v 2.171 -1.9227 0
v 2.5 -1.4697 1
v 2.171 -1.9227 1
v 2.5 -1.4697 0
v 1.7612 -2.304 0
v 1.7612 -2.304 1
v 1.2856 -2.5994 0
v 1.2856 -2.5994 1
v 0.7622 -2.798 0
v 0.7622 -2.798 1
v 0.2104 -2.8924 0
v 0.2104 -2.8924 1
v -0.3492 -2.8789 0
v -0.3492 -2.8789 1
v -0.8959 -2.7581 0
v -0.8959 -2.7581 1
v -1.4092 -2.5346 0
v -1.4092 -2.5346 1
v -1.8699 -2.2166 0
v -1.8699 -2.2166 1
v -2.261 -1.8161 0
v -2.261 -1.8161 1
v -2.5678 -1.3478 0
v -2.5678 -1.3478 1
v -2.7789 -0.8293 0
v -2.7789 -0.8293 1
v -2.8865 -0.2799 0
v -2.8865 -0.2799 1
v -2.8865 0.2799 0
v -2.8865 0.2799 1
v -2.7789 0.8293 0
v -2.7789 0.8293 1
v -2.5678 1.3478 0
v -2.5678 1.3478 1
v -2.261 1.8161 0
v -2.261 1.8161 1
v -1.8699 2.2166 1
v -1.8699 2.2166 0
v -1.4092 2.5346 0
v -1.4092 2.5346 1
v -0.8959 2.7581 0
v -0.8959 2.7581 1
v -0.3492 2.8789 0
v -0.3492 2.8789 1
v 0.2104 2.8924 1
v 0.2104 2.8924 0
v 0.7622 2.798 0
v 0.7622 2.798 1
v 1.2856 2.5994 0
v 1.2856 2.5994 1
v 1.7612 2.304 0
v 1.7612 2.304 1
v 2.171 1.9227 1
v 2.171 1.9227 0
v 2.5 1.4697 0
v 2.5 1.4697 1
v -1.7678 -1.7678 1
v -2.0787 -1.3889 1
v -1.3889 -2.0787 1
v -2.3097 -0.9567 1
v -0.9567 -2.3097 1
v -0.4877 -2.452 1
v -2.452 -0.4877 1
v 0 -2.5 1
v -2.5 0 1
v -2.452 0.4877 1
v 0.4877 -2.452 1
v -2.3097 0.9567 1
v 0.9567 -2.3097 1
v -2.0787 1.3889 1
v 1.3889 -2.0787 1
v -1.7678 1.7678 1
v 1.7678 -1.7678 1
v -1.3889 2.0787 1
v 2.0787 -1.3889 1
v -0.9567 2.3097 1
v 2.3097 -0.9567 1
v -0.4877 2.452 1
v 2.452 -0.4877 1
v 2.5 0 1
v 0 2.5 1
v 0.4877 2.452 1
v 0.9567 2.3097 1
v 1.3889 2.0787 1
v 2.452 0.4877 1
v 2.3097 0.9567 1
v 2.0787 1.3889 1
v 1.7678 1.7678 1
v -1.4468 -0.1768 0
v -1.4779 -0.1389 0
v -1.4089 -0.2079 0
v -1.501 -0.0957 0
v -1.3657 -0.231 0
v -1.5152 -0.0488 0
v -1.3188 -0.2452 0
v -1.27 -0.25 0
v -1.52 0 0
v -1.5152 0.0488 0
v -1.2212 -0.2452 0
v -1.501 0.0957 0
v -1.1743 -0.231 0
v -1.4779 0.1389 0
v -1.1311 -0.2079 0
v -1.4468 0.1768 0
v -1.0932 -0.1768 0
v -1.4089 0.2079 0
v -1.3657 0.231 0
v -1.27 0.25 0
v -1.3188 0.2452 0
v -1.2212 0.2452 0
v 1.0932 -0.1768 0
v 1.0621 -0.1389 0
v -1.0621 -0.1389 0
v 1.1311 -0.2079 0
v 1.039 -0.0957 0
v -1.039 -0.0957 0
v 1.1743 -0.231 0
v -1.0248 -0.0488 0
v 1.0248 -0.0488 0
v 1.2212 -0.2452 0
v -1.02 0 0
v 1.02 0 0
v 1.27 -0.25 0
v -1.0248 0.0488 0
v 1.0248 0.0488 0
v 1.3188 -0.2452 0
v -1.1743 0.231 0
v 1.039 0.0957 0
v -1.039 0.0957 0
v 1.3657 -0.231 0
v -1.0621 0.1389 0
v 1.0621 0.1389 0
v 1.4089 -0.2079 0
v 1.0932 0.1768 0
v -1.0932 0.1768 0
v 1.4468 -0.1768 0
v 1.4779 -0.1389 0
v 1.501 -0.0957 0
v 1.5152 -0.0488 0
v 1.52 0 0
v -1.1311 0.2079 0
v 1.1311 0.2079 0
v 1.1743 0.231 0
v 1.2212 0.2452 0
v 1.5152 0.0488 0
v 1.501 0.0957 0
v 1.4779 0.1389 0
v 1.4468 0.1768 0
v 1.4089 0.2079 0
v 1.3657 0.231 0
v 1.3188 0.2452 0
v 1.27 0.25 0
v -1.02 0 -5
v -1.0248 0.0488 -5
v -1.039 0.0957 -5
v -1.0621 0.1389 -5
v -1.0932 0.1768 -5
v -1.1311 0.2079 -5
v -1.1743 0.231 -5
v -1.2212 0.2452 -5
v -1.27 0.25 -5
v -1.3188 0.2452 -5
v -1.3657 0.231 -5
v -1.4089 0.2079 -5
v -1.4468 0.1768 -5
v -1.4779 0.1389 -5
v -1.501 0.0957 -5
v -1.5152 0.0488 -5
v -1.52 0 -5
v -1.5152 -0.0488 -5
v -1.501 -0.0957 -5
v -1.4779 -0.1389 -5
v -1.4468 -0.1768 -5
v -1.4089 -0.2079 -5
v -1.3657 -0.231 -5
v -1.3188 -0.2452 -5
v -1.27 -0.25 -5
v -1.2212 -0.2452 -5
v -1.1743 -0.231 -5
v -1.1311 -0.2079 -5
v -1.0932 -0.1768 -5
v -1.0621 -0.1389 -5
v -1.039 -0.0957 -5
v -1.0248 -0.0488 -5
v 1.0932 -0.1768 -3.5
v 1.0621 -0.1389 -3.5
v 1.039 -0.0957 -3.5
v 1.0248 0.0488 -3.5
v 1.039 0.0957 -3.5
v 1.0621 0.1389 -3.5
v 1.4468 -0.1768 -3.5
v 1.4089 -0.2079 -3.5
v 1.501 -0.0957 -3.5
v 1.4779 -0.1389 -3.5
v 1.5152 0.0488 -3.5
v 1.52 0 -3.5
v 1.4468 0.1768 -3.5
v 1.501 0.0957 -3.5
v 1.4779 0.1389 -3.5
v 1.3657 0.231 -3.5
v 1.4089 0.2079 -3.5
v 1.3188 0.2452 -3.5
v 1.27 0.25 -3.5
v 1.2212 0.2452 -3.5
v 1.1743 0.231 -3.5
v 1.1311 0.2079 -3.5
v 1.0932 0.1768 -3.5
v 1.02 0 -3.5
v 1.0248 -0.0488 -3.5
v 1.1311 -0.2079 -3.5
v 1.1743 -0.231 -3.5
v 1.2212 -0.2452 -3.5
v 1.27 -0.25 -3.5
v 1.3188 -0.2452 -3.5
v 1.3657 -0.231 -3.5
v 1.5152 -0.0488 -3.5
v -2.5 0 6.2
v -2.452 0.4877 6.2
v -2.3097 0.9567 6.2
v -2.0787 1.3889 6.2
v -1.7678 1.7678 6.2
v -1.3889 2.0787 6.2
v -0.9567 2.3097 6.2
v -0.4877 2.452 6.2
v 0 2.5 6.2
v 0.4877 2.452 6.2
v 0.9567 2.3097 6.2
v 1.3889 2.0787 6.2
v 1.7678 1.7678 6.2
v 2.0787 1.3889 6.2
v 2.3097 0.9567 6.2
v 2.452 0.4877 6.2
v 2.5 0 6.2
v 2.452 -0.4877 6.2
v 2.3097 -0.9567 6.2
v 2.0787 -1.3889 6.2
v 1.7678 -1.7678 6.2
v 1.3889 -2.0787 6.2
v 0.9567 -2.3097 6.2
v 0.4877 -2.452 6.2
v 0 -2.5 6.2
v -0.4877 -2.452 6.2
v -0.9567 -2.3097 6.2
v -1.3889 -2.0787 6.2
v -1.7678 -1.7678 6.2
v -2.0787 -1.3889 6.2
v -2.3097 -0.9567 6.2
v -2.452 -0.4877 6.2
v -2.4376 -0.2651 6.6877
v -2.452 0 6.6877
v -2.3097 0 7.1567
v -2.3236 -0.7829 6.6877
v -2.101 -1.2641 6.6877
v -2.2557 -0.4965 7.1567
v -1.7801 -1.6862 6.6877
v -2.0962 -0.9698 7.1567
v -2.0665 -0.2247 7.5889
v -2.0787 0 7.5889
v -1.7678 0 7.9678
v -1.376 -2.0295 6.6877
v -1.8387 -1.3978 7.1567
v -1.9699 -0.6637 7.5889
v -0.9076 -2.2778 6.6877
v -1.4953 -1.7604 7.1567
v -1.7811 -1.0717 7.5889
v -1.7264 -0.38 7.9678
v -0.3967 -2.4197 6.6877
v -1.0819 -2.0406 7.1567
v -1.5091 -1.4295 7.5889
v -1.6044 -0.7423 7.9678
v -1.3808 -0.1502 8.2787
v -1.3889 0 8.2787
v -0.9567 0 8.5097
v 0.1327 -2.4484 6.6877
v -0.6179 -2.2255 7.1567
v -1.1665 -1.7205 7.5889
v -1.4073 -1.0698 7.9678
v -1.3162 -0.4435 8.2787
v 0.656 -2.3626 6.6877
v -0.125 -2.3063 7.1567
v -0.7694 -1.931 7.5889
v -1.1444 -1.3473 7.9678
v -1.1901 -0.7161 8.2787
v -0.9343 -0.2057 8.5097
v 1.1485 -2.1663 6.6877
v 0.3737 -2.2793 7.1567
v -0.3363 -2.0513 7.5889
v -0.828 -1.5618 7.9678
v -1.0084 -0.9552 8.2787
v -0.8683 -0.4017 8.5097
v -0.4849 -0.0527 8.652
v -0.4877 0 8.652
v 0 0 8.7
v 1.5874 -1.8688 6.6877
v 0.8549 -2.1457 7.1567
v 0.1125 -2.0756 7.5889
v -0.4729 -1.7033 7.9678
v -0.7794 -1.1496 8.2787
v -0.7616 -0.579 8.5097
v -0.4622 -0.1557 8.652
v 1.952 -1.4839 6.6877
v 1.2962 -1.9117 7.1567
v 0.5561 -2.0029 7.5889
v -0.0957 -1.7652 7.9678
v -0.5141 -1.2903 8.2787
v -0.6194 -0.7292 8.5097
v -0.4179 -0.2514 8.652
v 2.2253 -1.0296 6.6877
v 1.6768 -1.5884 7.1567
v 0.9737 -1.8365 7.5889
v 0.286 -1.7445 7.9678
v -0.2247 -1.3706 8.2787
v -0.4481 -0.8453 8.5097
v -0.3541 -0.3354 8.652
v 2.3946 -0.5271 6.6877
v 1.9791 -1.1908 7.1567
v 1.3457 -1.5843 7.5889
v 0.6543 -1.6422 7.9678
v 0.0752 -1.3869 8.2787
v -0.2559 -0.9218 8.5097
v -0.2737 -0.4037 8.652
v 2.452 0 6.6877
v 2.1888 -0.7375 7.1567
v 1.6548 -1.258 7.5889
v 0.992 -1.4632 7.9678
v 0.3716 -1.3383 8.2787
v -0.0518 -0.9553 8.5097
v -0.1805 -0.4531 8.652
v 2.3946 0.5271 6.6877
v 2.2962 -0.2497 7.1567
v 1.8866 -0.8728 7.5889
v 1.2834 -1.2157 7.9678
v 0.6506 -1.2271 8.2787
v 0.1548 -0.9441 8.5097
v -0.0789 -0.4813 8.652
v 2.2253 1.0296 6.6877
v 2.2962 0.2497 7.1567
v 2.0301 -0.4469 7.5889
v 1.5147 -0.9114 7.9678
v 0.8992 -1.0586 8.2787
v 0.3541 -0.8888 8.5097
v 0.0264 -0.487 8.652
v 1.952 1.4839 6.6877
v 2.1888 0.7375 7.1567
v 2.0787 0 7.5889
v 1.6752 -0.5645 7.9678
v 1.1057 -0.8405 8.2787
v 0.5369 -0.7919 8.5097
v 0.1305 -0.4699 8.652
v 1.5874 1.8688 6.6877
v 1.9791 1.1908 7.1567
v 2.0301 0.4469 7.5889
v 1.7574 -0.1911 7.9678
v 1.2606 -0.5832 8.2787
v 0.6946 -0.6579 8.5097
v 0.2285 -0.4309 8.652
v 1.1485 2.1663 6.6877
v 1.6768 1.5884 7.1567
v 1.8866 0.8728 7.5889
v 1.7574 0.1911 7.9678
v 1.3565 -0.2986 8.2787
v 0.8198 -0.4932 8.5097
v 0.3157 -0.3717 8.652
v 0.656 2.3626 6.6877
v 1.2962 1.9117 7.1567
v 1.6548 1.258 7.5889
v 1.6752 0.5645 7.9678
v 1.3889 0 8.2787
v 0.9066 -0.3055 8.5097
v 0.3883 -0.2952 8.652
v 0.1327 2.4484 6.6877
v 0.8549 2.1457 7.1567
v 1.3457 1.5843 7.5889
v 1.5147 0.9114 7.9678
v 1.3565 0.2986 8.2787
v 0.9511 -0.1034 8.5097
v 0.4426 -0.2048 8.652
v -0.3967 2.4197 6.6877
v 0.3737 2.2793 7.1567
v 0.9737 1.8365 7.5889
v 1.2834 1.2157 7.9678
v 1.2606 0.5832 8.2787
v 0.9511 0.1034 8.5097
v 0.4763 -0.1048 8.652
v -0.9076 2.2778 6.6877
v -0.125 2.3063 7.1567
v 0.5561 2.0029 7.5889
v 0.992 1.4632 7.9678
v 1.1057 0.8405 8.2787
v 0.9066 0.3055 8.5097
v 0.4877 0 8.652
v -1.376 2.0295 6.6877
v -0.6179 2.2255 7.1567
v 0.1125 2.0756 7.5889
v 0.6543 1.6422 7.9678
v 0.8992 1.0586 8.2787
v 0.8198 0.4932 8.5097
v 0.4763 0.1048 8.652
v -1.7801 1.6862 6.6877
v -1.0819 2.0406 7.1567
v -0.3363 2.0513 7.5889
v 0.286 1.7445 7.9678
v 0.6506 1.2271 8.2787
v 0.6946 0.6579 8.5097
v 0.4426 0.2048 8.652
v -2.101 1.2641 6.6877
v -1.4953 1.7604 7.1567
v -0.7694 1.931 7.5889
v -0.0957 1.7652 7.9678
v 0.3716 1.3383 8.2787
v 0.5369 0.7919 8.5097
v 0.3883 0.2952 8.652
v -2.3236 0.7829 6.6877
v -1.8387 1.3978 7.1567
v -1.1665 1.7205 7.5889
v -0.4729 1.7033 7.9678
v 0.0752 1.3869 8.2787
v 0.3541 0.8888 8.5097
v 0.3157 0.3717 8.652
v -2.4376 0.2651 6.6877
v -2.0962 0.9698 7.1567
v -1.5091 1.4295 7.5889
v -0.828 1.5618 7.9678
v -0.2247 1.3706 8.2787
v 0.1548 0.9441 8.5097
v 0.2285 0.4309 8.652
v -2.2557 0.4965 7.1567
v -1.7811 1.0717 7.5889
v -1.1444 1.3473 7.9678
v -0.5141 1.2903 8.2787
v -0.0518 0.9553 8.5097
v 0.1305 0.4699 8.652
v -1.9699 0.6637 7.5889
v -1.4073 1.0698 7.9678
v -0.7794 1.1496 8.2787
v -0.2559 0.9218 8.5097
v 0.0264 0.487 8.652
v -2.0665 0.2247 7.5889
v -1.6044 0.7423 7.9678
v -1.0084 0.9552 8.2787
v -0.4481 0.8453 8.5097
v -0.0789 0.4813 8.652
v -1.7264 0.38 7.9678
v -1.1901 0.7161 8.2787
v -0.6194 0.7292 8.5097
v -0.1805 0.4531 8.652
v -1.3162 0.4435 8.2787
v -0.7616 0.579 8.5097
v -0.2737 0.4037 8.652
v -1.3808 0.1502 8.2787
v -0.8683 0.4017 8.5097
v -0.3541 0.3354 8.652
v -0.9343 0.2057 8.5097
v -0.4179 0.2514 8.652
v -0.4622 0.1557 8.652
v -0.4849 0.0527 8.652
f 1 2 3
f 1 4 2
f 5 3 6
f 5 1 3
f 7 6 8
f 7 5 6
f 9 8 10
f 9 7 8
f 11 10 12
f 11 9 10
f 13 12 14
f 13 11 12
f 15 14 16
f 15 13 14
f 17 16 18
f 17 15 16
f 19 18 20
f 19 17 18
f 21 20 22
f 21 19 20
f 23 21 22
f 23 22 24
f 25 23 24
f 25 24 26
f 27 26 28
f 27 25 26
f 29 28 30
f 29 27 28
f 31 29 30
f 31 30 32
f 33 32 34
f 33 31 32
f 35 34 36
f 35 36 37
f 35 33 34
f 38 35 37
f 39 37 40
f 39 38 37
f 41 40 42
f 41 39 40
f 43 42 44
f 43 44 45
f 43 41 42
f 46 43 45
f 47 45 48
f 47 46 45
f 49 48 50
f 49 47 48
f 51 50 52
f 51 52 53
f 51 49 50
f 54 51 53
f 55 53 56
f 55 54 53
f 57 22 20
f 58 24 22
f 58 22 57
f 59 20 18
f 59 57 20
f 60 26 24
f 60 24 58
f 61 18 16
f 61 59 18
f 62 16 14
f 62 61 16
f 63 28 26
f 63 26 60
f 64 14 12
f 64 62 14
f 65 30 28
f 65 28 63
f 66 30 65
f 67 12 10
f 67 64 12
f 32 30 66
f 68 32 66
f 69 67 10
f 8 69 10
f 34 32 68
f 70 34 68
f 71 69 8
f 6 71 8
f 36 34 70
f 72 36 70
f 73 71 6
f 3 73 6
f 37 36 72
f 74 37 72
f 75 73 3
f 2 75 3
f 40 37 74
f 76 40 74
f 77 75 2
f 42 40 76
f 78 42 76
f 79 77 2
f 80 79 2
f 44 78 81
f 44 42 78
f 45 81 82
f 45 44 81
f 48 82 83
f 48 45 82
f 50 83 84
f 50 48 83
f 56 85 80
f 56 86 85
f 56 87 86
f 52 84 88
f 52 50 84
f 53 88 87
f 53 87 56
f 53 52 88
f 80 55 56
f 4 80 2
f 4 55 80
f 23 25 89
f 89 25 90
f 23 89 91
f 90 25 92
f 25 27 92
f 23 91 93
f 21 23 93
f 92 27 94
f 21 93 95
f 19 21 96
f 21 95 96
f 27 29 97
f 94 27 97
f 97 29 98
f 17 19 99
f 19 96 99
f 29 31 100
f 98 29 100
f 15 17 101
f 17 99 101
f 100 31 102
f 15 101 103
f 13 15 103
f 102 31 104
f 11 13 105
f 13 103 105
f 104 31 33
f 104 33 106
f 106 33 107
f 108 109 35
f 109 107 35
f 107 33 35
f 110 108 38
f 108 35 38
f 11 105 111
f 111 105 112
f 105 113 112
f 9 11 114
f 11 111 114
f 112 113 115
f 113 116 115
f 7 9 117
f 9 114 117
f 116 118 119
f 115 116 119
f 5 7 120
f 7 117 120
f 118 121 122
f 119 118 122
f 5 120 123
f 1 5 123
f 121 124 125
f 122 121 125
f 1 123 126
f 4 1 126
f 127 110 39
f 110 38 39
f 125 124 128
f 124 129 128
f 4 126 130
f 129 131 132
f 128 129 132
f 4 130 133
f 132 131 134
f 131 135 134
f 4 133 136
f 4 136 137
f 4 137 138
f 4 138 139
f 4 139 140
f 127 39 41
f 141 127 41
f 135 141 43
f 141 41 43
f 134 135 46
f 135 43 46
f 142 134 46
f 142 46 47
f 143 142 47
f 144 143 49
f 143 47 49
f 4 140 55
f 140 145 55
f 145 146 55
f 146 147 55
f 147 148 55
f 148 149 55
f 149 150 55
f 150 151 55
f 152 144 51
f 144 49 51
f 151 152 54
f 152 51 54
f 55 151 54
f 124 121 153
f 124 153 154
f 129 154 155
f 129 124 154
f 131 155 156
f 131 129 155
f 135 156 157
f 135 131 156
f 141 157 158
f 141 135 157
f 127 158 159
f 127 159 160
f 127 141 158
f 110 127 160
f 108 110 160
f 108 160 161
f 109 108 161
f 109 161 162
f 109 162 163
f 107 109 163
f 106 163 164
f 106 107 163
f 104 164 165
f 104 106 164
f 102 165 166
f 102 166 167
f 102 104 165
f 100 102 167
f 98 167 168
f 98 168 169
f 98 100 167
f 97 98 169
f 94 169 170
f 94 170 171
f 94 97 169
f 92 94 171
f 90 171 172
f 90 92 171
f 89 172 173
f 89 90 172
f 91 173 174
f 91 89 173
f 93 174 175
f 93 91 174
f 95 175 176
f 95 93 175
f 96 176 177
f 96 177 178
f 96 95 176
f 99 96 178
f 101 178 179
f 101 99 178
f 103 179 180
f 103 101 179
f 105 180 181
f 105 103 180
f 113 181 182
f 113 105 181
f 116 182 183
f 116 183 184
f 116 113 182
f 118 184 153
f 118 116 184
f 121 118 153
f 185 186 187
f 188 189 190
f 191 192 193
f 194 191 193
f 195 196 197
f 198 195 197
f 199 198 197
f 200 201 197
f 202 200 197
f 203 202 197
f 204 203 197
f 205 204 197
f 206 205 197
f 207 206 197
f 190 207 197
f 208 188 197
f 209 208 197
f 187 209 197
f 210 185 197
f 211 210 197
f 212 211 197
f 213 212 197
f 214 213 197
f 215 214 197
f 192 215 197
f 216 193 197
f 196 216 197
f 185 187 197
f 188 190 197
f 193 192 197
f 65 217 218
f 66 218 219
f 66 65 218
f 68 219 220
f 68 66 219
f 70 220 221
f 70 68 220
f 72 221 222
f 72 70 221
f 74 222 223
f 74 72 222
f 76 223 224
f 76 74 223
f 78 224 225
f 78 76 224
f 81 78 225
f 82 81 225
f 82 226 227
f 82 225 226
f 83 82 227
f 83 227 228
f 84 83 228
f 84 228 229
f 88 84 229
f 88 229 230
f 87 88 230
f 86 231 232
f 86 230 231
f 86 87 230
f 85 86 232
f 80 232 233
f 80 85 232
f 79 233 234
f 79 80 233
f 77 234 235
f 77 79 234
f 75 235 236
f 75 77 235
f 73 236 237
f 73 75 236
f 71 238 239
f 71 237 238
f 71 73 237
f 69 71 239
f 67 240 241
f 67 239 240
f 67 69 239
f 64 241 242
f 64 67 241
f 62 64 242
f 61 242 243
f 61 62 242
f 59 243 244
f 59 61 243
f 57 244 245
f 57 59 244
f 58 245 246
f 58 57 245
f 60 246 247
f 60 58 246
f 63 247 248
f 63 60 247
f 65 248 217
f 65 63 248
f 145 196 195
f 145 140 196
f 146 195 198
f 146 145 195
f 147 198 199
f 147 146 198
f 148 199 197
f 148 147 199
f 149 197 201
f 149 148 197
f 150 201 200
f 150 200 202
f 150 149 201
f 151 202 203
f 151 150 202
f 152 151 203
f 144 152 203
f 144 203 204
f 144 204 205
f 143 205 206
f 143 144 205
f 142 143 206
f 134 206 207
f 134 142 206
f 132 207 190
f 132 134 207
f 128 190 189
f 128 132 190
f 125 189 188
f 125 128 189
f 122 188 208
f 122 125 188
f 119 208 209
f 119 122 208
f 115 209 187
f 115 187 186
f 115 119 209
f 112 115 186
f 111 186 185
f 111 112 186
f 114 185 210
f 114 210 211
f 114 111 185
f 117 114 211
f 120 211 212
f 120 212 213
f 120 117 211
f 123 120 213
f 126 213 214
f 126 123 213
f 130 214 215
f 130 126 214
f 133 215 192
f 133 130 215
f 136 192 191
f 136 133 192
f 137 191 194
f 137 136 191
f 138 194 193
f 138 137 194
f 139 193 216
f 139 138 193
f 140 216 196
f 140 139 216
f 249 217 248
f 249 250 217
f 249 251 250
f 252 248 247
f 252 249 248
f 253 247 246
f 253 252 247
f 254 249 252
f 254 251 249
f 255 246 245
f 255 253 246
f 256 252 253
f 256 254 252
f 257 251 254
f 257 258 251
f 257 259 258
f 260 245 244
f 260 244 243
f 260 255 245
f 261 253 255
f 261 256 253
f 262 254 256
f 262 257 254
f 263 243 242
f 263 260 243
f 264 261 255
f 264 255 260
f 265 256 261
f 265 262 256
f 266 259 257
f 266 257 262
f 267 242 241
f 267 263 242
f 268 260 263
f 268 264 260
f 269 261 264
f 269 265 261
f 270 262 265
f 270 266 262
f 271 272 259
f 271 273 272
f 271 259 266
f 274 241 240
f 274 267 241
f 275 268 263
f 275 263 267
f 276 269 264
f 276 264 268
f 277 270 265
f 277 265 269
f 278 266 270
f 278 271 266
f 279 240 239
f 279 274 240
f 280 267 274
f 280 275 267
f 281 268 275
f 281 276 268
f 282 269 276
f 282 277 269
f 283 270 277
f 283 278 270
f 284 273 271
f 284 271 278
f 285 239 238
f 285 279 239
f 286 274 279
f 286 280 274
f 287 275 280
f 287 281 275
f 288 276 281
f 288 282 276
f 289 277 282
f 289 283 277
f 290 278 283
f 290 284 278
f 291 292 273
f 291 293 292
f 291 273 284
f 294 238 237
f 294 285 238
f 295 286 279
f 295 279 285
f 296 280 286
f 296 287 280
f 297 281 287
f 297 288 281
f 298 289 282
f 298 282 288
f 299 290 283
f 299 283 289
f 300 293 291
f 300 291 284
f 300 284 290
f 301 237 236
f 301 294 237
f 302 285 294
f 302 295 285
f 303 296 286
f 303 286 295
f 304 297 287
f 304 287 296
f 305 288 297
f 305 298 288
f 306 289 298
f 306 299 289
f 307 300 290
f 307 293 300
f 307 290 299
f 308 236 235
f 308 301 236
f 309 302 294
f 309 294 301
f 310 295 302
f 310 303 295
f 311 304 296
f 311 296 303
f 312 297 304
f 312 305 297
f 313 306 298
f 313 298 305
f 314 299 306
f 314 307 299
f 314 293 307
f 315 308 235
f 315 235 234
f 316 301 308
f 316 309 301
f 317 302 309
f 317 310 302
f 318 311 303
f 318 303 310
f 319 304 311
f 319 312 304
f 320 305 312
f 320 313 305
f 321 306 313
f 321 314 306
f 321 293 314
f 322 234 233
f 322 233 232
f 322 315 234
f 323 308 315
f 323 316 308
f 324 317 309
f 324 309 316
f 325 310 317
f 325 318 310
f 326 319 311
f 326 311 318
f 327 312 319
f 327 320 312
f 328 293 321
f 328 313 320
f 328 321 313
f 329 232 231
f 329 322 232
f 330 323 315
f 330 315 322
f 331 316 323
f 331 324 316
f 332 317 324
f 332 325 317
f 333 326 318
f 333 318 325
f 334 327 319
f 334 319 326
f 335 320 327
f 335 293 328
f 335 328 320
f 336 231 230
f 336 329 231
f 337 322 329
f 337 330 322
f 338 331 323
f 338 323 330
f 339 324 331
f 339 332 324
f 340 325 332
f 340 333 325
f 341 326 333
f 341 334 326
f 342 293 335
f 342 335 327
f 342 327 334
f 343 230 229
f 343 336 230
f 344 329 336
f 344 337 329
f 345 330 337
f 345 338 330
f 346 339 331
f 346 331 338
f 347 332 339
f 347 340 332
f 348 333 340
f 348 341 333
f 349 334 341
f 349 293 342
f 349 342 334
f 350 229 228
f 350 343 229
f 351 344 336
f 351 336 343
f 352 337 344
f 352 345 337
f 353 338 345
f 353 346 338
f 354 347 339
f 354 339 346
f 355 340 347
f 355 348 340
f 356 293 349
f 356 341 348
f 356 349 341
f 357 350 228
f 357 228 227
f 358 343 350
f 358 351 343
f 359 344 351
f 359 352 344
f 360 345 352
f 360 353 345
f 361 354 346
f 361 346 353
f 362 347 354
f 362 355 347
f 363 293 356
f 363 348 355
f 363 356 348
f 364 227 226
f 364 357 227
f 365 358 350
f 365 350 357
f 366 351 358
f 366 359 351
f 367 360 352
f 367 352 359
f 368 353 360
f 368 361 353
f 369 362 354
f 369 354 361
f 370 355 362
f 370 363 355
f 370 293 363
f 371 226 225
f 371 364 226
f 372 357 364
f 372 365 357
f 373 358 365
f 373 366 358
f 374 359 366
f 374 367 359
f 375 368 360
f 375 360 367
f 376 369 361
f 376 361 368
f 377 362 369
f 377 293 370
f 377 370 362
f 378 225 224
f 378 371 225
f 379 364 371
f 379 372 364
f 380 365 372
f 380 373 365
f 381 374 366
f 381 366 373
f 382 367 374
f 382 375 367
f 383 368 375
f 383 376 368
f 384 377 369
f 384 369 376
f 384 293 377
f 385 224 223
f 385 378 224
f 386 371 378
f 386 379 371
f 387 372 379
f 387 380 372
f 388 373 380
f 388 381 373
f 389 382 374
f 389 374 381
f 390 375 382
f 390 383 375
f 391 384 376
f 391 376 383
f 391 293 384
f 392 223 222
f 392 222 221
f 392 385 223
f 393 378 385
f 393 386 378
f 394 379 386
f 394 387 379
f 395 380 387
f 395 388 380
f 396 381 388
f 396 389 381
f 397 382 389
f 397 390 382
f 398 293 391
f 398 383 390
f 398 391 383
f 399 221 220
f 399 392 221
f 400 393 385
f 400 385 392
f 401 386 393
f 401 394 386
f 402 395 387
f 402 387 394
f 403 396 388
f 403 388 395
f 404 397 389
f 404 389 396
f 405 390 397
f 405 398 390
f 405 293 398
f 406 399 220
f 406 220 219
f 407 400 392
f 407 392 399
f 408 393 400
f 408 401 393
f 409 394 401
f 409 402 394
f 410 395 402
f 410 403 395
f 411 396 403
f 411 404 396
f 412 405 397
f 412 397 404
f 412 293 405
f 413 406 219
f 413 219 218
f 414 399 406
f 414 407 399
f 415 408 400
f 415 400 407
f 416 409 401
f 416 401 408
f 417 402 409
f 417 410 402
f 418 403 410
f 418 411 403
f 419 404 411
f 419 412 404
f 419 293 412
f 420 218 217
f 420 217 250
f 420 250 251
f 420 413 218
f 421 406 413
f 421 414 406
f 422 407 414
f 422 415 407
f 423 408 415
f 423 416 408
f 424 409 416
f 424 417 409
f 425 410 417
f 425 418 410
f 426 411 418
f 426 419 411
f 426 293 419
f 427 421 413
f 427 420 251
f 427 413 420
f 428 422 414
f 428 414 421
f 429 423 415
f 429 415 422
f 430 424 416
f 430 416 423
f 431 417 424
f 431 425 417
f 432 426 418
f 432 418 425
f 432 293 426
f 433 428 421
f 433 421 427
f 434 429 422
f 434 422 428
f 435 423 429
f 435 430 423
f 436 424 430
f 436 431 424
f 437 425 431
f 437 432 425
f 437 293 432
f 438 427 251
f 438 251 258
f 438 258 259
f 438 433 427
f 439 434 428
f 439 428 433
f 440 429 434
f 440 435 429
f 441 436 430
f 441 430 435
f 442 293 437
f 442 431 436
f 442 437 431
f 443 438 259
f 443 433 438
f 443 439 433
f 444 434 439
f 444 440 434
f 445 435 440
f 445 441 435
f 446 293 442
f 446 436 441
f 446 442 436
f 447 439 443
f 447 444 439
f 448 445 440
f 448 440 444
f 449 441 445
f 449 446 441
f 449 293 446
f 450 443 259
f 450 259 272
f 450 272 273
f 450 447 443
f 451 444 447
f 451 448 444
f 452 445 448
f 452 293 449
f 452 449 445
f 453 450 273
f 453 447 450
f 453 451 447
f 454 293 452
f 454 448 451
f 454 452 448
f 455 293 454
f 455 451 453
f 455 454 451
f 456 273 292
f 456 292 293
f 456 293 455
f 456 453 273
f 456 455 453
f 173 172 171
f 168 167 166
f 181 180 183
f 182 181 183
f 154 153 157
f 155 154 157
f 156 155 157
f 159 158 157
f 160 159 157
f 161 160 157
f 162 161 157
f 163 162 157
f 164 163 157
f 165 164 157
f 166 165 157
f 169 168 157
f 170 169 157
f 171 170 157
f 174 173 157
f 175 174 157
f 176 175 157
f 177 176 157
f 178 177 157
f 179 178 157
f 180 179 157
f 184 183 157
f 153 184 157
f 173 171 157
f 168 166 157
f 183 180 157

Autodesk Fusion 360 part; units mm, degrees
sketch "スケッチ1" plane through (0, 0, 0) normal (0, 0, 1) x (1, 0, 0)
  circle A0 centre (0, 0) radius 2.9
  line L0 (2.5, 1.4697) -> (2.5, -1.4697)
  circle A1 centre (-1.27, 0) radius 0.25
  line L1 (-3.5255, 0) -> (3.8644, 0) construction
  line L2 (0, 3.5138) -> (0, -4.0944) construction
  circle A2 centre (1.27, 0) radius 0.25
  dimension "d1" = 5.8
  dimension "d8" = 2.5
  dimension "d11" = 0.5
  dimension "d14" = 1.27
extrude "押し出し1" add sketch "スケッチ1" along normal blind 1 contours A0 L0 | A0 L0 | A1 | A2
sketch "スケッチ2" plane through (0, 0, 1) normal (0, 0, 1) x (-1, 0, 0)
  circle A0 centre (0, 0) radius 2.9
  circle A1 centre (0, 0) radius 2.5
  dimension "d4" = 5
extrude "押し出し2" add sketch "スケッチ2" along normal blind 7.7 contours A1
fillet "フィレット1" radius 2.5 1 edges at (2.3308, 0.904, 8.7)
extrude "押し出し3" cut sketch "スケッチ1" along normal blind 1 contours A0 L0 picked at (2.5576, -0.3752)
extrude "押し出し4" add sketch "スケッチ1" against normal blind 5 contours A1
extrude "押し出し5" add sketch "スケッチ1" against normal blind 3.5 contours A2
